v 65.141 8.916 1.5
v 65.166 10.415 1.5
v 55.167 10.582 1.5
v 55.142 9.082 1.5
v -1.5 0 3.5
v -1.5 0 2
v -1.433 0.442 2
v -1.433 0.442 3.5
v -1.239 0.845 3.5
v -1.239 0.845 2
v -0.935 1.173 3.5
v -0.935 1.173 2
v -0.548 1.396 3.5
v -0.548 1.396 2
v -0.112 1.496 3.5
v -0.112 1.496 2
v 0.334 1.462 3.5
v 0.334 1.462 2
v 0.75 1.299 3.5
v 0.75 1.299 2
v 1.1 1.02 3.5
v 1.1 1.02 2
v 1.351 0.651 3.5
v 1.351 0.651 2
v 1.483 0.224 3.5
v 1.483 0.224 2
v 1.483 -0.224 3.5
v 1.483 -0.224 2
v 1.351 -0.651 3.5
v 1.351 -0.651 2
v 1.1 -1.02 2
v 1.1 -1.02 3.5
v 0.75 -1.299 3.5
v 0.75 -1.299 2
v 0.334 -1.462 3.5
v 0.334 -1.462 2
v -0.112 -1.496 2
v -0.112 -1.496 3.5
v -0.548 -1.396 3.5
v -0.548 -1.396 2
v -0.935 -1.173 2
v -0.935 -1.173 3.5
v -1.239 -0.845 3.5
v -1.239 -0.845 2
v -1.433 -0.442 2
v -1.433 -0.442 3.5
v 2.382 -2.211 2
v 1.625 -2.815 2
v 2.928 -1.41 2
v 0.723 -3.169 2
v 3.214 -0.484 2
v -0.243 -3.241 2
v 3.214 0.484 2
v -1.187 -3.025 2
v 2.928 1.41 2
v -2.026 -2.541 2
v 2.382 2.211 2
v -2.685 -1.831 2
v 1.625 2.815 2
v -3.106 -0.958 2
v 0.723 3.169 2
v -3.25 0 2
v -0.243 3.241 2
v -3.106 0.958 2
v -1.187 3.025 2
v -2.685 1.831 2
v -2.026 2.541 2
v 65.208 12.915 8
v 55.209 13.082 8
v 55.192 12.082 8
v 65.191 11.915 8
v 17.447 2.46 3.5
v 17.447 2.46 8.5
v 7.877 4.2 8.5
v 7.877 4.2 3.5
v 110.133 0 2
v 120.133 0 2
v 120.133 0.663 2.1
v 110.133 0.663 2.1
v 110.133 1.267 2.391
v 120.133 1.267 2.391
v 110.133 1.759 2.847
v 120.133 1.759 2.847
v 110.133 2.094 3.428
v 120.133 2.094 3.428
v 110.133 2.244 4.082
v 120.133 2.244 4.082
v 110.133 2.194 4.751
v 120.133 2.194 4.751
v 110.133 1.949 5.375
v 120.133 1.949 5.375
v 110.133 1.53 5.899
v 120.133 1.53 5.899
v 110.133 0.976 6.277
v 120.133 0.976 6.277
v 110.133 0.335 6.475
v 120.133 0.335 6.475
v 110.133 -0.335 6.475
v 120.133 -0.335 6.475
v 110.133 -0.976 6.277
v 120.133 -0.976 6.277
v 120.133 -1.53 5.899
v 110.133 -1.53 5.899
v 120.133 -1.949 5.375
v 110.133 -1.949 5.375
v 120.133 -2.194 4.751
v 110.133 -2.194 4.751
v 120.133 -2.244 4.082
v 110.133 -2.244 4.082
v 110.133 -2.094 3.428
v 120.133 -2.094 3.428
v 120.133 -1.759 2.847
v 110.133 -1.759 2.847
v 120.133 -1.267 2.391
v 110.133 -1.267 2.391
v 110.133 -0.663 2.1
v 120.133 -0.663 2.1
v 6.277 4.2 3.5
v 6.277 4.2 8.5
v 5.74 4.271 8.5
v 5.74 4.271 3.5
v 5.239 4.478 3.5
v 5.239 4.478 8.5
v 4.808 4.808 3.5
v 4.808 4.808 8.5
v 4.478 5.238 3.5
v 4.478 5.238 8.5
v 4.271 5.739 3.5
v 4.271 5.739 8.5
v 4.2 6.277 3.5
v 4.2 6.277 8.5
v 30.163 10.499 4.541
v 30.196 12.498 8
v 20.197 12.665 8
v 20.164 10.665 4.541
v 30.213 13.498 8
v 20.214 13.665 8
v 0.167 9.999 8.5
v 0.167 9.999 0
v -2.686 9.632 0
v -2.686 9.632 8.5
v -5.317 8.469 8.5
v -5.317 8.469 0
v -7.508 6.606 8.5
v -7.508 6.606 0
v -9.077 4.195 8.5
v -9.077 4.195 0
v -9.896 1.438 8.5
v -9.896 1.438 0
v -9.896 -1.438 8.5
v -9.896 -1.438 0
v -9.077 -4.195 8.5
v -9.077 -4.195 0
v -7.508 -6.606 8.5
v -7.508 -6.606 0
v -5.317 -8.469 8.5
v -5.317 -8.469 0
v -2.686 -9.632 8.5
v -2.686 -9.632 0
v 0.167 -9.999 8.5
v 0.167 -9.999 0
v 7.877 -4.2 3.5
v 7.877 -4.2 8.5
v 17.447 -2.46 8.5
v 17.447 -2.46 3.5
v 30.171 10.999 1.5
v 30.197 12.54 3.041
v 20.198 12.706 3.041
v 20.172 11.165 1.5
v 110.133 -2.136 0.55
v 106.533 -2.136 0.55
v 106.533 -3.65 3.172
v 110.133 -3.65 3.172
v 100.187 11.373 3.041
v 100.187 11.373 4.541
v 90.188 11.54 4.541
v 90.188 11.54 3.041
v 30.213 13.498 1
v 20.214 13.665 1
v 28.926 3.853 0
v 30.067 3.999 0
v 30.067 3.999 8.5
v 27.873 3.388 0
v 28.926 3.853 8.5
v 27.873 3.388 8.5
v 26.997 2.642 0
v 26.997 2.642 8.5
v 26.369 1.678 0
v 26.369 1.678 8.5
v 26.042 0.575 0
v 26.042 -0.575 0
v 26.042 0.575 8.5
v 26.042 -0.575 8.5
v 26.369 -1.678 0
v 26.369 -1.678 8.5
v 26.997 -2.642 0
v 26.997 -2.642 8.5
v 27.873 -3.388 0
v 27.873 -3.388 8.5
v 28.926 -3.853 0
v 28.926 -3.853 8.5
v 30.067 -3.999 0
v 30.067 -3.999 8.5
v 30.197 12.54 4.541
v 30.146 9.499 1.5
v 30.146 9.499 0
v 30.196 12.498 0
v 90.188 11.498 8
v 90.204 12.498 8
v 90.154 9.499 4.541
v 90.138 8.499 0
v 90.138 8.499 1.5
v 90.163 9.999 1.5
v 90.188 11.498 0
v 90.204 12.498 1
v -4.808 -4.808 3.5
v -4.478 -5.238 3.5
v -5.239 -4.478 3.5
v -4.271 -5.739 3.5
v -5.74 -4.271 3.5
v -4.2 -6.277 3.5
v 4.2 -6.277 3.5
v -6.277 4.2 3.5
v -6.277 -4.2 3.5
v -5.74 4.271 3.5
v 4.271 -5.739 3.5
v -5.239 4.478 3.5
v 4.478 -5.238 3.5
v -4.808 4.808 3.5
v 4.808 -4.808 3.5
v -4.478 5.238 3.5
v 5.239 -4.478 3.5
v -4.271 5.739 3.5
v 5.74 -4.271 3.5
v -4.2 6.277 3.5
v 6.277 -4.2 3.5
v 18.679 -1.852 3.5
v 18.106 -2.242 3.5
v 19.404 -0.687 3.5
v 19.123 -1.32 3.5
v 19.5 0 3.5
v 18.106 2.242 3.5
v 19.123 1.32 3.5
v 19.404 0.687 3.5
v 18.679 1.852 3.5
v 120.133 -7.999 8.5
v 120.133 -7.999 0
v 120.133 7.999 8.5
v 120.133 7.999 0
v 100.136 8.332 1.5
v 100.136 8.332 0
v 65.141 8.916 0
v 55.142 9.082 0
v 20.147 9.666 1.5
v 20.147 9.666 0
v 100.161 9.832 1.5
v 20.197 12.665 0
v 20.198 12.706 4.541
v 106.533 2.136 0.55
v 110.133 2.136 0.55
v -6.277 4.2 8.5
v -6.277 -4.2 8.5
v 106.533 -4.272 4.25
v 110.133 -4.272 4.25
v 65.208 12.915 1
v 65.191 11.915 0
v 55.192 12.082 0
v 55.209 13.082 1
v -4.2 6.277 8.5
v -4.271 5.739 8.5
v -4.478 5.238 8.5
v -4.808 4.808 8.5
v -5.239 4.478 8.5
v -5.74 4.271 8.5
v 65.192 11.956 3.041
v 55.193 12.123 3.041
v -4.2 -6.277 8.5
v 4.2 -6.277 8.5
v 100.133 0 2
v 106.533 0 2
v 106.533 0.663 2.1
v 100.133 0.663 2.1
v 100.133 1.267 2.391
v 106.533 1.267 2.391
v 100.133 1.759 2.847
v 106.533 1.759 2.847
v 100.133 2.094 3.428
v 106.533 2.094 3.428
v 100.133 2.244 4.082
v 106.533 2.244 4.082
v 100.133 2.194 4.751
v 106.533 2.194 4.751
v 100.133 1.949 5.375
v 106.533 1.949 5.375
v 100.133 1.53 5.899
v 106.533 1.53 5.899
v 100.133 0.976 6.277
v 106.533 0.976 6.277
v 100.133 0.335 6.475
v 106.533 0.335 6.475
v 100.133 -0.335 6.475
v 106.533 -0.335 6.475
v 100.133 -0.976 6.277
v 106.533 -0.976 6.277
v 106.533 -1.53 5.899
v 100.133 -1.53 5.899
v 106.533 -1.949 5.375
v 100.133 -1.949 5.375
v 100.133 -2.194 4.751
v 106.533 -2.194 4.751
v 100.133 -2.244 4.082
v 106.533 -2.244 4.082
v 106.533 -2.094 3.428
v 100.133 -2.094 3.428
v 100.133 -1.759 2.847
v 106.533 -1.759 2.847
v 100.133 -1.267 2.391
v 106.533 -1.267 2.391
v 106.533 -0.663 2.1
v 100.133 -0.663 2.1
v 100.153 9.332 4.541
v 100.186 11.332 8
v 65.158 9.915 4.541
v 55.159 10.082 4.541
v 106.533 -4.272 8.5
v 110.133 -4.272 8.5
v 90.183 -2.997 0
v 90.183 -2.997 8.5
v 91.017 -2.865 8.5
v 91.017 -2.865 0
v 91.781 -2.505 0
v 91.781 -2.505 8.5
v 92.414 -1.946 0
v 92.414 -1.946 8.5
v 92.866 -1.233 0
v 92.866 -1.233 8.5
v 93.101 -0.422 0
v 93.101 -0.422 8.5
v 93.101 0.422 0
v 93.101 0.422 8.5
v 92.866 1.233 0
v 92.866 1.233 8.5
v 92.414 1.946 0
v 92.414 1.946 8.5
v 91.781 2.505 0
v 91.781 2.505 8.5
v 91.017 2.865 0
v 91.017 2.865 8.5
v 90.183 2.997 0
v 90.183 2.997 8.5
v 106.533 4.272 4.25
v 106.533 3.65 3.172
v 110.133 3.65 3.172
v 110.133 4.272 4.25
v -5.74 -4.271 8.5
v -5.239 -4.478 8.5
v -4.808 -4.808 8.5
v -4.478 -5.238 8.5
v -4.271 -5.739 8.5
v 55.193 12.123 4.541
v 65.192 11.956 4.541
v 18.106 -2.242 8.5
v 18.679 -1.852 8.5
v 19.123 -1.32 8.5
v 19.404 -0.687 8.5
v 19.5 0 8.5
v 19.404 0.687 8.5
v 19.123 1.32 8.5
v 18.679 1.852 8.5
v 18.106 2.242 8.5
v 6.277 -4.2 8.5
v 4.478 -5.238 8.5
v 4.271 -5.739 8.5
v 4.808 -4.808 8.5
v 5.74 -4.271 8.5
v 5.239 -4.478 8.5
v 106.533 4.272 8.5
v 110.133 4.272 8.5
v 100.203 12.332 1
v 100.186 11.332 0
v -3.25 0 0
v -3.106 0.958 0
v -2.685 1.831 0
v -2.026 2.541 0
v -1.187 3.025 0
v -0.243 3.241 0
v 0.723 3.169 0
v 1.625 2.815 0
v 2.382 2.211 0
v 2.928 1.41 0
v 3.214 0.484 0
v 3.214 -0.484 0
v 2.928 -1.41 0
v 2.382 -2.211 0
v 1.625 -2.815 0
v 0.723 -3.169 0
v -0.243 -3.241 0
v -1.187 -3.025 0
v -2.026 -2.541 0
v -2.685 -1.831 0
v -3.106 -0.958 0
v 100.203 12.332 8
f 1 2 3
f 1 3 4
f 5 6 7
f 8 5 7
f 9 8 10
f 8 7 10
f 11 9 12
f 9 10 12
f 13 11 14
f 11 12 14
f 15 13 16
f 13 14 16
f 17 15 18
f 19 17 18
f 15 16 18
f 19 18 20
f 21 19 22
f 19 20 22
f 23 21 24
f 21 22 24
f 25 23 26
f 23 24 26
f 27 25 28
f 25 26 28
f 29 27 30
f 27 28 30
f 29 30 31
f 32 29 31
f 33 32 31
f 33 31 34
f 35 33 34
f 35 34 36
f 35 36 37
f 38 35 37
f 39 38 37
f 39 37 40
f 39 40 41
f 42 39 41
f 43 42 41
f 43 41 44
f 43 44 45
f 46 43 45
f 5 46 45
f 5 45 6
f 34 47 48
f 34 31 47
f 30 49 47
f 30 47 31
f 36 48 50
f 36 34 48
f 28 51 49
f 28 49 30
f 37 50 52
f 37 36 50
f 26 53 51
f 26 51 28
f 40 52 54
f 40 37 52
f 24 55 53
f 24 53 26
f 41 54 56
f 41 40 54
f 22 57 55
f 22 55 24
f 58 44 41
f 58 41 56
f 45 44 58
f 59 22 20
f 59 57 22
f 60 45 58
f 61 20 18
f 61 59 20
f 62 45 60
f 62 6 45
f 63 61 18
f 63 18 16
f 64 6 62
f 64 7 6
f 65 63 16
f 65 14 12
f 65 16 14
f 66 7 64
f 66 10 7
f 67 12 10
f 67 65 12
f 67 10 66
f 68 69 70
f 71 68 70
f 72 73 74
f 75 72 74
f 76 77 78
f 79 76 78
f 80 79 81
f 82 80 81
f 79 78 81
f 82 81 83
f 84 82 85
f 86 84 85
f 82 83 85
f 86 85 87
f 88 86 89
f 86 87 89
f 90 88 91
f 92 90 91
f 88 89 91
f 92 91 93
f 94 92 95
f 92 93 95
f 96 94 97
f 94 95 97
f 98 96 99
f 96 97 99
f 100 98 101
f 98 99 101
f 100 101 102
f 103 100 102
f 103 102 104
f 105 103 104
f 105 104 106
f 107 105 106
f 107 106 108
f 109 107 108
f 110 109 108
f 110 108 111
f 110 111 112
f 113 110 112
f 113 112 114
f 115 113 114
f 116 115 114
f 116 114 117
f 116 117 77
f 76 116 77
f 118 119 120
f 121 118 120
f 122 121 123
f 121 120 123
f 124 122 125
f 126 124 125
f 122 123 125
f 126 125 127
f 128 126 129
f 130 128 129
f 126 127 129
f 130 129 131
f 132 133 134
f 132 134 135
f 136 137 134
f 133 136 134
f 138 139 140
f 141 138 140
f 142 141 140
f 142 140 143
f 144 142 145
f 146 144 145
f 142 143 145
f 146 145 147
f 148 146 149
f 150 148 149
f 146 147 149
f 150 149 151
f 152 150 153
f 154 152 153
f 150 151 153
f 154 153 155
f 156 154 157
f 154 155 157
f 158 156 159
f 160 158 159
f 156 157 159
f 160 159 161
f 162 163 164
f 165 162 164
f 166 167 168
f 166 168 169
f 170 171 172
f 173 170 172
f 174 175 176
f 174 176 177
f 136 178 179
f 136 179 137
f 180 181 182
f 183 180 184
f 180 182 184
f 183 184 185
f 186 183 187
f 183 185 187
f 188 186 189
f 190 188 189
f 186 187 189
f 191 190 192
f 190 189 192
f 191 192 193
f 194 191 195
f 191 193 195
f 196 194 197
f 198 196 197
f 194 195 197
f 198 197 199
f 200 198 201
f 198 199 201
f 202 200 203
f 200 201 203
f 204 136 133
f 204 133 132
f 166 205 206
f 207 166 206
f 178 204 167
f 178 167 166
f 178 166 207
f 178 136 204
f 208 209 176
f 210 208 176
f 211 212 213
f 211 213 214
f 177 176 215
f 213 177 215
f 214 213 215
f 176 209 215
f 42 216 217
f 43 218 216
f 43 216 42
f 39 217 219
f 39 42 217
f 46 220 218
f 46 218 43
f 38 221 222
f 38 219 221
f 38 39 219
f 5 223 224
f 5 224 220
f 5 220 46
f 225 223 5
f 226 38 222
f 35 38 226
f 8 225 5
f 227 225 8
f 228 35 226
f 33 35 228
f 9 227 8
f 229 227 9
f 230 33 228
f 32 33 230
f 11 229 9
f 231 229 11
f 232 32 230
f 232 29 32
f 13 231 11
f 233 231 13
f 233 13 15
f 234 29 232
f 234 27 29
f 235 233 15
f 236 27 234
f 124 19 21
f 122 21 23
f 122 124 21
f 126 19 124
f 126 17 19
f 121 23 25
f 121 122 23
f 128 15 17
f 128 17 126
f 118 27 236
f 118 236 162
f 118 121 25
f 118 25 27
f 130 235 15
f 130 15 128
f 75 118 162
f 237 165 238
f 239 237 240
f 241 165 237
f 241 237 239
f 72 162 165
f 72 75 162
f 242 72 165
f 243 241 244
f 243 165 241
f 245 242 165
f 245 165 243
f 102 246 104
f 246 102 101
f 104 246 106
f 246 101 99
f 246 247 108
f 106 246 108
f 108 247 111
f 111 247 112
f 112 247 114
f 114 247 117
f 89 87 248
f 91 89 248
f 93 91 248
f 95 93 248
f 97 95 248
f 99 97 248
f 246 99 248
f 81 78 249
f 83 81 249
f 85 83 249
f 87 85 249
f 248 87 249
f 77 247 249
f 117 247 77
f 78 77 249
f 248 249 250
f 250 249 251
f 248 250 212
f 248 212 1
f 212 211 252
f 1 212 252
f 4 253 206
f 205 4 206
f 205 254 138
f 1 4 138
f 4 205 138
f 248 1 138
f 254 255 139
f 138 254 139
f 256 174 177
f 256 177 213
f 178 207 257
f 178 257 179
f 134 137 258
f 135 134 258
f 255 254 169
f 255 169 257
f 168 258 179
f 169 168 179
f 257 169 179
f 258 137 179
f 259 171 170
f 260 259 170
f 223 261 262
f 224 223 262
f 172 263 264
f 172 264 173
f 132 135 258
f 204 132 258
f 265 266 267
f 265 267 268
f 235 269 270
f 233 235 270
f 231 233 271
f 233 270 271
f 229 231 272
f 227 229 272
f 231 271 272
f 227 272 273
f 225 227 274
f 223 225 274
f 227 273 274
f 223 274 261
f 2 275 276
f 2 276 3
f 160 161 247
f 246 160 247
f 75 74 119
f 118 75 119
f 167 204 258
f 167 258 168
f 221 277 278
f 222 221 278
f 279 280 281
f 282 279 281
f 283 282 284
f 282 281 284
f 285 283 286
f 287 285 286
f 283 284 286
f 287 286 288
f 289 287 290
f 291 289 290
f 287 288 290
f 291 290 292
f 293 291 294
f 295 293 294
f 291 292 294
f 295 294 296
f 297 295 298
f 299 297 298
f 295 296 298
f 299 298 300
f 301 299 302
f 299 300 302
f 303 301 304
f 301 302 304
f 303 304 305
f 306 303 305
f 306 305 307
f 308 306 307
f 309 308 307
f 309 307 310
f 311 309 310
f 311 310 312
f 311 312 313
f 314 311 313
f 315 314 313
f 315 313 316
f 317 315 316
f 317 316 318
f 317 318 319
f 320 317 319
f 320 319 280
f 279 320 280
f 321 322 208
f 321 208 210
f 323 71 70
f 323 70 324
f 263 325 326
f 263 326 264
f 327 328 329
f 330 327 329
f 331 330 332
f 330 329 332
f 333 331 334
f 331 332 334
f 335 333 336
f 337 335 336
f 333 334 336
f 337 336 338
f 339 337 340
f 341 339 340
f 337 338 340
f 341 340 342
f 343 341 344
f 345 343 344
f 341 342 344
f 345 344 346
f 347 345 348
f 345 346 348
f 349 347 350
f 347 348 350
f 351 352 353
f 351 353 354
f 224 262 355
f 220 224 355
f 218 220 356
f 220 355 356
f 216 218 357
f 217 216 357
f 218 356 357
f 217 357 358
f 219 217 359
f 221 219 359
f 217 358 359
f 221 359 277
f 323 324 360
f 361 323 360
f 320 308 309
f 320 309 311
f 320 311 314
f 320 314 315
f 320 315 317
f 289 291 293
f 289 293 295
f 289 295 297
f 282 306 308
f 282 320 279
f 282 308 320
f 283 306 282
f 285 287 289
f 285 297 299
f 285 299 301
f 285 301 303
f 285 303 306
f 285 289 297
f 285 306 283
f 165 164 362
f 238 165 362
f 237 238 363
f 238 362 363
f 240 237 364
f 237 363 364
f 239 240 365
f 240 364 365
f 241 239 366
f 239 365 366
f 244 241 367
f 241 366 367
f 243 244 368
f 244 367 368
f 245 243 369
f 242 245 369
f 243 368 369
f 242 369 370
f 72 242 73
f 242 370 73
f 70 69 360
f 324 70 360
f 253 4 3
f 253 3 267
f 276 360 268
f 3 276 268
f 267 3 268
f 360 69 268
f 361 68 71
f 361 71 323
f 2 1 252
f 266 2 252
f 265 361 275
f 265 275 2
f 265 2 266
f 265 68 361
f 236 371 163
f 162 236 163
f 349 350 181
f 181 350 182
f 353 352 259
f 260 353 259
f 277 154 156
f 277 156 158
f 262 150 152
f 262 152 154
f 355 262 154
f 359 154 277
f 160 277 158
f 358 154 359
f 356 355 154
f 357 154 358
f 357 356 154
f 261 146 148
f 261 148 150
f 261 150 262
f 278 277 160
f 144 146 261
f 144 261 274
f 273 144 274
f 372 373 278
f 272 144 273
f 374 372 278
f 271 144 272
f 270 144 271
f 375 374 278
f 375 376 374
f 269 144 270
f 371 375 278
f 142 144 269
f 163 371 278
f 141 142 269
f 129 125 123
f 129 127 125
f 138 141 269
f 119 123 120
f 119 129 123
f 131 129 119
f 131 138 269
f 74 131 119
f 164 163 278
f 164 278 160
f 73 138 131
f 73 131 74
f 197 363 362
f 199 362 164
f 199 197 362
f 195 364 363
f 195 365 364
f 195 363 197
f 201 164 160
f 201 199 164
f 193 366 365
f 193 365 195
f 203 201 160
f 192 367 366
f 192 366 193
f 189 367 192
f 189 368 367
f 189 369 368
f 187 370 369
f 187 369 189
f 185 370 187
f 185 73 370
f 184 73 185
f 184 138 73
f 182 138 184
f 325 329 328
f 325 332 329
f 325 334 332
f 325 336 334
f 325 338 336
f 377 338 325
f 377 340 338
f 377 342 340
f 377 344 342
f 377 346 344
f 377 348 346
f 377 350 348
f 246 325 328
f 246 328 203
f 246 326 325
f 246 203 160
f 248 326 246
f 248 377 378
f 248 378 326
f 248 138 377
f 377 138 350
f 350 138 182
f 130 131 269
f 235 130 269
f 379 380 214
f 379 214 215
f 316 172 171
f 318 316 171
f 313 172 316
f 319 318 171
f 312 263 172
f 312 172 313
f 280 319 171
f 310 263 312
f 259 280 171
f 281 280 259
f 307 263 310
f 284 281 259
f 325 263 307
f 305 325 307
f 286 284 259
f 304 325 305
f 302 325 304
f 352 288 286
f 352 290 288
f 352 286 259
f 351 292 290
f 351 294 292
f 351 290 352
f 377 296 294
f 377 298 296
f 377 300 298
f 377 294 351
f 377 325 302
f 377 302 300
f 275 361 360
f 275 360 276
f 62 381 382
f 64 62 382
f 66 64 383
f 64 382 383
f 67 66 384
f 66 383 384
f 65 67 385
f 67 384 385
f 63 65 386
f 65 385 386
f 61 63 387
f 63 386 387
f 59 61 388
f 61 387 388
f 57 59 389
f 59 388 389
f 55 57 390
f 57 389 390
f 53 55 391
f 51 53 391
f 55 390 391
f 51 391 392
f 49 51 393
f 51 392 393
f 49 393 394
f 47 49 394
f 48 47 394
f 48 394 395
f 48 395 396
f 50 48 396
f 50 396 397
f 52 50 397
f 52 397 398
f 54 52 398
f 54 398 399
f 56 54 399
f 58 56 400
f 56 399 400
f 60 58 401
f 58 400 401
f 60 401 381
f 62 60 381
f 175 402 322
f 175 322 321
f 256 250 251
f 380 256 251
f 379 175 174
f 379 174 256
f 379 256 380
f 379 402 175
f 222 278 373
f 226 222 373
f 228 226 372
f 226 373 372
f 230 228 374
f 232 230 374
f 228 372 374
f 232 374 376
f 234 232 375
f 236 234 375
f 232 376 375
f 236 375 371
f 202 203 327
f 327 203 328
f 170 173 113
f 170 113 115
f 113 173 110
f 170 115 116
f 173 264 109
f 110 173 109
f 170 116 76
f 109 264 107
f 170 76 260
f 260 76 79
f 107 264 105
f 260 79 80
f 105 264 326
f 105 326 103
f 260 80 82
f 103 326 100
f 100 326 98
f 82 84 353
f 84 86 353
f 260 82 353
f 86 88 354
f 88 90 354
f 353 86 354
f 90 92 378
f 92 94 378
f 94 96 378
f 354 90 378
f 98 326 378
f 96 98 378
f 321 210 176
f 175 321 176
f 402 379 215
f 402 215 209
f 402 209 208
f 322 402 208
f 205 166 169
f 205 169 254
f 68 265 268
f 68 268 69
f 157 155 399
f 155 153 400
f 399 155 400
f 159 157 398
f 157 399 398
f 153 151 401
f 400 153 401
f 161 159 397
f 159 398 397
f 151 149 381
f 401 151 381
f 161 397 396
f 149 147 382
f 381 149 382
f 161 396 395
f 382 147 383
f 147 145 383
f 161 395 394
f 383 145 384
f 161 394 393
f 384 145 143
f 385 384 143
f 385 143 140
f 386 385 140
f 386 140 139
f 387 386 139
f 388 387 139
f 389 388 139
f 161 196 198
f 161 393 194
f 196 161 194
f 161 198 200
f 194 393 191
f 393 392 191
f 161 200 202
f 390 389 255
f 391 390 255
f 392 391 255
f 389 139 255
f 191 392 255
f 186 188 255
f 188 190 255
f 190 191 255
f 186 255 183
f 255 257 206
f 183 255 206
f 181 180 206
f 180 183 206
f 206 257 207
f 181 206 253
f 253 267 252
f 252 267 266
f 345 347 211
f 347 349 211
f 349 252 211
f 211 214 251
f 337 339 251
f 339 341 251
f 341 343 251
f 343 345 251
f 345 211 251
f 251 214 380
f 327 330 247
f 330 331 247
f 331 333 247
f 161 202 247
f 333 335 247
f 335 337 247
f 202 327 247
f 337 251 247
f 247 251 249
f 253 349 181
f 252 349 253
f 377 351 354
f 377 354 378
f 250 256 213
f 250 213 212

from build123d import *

# Parameters (mm, degrees)
AUFSATZ_LINEAR_AUSTRAGEN1_DEPTH = 8.5
CUT_EXTRUDE4_DEPTH              = 5
SKETCH2_R                       = 1.5
CUT_EXTRUDE5_DEPTH              = 9.5
CUT_EXTRUDE6_DEPTH              = 9.5
SKETCH3_W                       = 3.6
SKETCH3_H                       = 7.3
CUT_EXTRUDE9_DEPTH              = 7.95
SKETCH4_R                       = 2.25
CUT_EXTRUDE10_DEPTH             = 20
BOSS_EXTRUDE1_START             = -20
BOSS_EXTRUDE1_DEPTH             = 10
AUFSATZ_LINEAR_AUSTRAGEN2_DEPTH = 3.6
SCHNITT_LINEAR_AUSTRAGEN1_DEPTH = 3.6
LPATTERN1_COUNT                 = 3
LPATTERN1_PITCH                 = 35
SKIZZE4_R                       = 3.25
SCHNITT_LINEAR_AUSTRAGEN2_DEPTH = 2


with BuildPart() as part:
    # Skizze1 → Aufsatz-Linear austragen1 (new body)
    with BuildSketch(Plane.XY):
        with BuildLine():
            Line((120.133333333, 7.998888812), (0.166666667, 9.998611015))
            ThreePointArc((0.166666667, 9.998611015), (-10, 0), (0.166666667, -9.998611015))
            Line((0.166666667, -9.998611015), (120.133333333, -7.998888812))
            Line((120.133333333, -7.998888812), (120.133333333, 7.998888812))
        make_face()
    extrude(amount=AUFSATZ_LINEAR_AUSTRAGEN1_DEPTH)

    # Sketch1 → Cut-Extrude4 (cut)
    with BuildSketch(Plane.XY.offset(8.5)):
        with BuildLine():
            Line((-4.200128323, -6.276826928), (4.200128323, -6.276826928))
            ThreePointArc((4.200128323, -6.276826928), (4.808454435, -4.808197778), (6.277083585, -4.199871666))
            Line((6.277083585, -4.199871666), (7.877083585, -4.199871666))
            Line((7.877083585, -4.199871666), (17.44738825, -2.459668071))
            ThreePointArc((17.44738825, -2.459668071), (19.500137785, 0), (17.44738825, 2.459668071))
            Line((17.44738825, 2.459668071), (7.877083585, 4.199871666))
            Line((7.877083585, 4.199871666), (6.277083585, 4.199871666))
            ThreePointArc((6.277083585, 4.199871666), (4.808454435, 4.808197778), (4.200128323, 6.276826928))
            Line((4.200128323, 6.276826928), (-4.200128323, 6.276826928))
            ThreePointArc((-4.200128323, 6.276826928), (-4.808454435, 4.808197778), (-6.277083585, 4.199871666))
            Line((-6.277083585, 4.199871666), (-6.277083585, -4.199871666))
            ThreePointArc((-6.277083585, -4.199871666), (-4.808454435, -4.808197778), (-4.200128323, -6.276826928))
        make_face()
    extrude(amount=-CUT_EXTRUDE4_DEPTH, mode=Mode.SUBTRACT)

    # Sketch2 → Cut-Extrude5 (cut, through all)
    with BuildSketch(Plane(origin=(0, 0, 0), x_dir=(-1, 0, 0), z_dir=(0, 0, -1))):
        Circle(SKETCH2_R)
    extrude(amount=-CUT_EXTRUDE5_DEPTH, mode=Mode.SUBTRACT)

    # Skizze2 → Cut-Extrude6 (cut, through all)
    with BuildSketch(Plane.XY.offset(8.5)):
        with BuildLine():
            Line((90.183296296, 2.997361391), (30.066666667, 3.999444406))
            ThreePointArc((30.066666667, 3.999444406), (26, 0), (30.066666667, -3.999444406))
            Line((30.066666667, -3.999444406), (90.183296296, -2.997361391))
            ThreePointArc((90.183296296, -2.997361391), (93.131111111, 0), (90.183296296, 2.997361391))
        make_face()
    extrude(amount=-CUT_EXTRUDE6_DEPTH, mode=Mode.SUBTRACT)

    # Sketch3 → Cut-Extrude9 (cut)
    with BuildSketch(Plane.XY.offset(8.5)):
        with Locations((108.333333333, 0)):
            Rectangle(SKETCH3_W, SKETCH3_H)
    extrude(amount=-CUT_EXTRUDE9_DEPTH, mode=Mode.SUBTRACT)

    # Sketch4 → Cut-Extrude10 (cut)
    with BuildSketch(Plane(origin=(120.133333333, 0, 0), x_dir=(0, 0, -1), z_dir=(1, 0, 0))):
        with Locations((-4.25, 0)):
            Circle(SKETCH4_R)
    extrude(amount=-CUT_EXTRUDE10_DEPTH, mode=Mode.SUBTRACT)

    # Sketch5 → Boss-Extrude1 (add)
    with BuildSketch(Plane(origin=(119.966666667, -1.999722203, 0), x_dir=(0, 0, -1), z_dir=(0.999861101, -0.016666667, 0)).offset(BOSS_EXTRUDE1_START)):
        Polygon((0, 10), (0, 13), (-1, 14), (-8, 14), (-8, 13), (-4.541308146, 11), (-4.541308146, 13.041308146), (-3.041308146, 13.041308146), (-1.5, 11.5), (-1.5, 10), align=None)
    boss_extrude1 = extrude(amount=-BOSS_EXTRUDE1_DEPTH)

    # Skizze3 → Aufsatz-Linear austragen2 (add)
    with BuildSketch(Plane(origin=(106.533333333, 0, 0), x_dir=(0, 0, -1), z_dir=(1, 0, 0))):
        Polygon((-0.55, 3.65), (-3.171985448, 3.65), (-0.55, 2.136195996), align=None)
        Polygon((-0.55, -3.65), (-0.55, -2.136195996), (-3.171985448, -3.65), align=None)
    extrude(amount=AUFSATZ_LINEAR_AUSTRAGEN2_DEPTH)

    # Skizze3_3 → Schnitt-Linear austragen1 (cut)
    with BuildSketch(Plane(origin=(106.533333333, 0, 0), x_dir=(0, 0, -1), z_dir=(1, 0, 0))):
        Polygon((-5.328014552, 3.65), (-4.25, 4.272391992), (-8.5, 4.272391992), (-8.5, 3.65), align=None)
        Polygon((-3.171985448, 3.65), (-4.25, 4.272391992), (-5.328014552, 3.65), align=None)
        Polygon((-3.171985448, -3.65), (-5.328014552, -3.65), (-4.25, -4.272391992), align=None)
        Polygon((-5.328014552, -3.65), (-8.5, -3.65), (-8.5, -4.272391992), (-4.25, -4.272391992), align=None)
    extrude(amount=SCHNITT_LINEAR_AUSTRAGEN1_DEPTH, mode=Mode.SUBTRACT)

    # LPattern1: Boss-Extrude1 ×3
    with Locations(*[Vector(-0.999861101, 0.016666667, 0) * (i * LPATTERN1_PITCH) for i in range(1, LPATTERN1_COUNT)]):
        add(boss_extrude1)

    # Skizze4 → Schnitt-Linear austragen2 (cut)
    with BuildSketch(Plane(origin=(0, 0, 0), x_dir=(-1, 0, 0), z_dir=(0, 0, -1))):
        Circle(SKIZZE4_R)
    extrude(amount=-SCHNITT_LINEAR_AUSTRAGEN2_DEPTH, mode=Mode.SUBTRACT)


solid = part.part
